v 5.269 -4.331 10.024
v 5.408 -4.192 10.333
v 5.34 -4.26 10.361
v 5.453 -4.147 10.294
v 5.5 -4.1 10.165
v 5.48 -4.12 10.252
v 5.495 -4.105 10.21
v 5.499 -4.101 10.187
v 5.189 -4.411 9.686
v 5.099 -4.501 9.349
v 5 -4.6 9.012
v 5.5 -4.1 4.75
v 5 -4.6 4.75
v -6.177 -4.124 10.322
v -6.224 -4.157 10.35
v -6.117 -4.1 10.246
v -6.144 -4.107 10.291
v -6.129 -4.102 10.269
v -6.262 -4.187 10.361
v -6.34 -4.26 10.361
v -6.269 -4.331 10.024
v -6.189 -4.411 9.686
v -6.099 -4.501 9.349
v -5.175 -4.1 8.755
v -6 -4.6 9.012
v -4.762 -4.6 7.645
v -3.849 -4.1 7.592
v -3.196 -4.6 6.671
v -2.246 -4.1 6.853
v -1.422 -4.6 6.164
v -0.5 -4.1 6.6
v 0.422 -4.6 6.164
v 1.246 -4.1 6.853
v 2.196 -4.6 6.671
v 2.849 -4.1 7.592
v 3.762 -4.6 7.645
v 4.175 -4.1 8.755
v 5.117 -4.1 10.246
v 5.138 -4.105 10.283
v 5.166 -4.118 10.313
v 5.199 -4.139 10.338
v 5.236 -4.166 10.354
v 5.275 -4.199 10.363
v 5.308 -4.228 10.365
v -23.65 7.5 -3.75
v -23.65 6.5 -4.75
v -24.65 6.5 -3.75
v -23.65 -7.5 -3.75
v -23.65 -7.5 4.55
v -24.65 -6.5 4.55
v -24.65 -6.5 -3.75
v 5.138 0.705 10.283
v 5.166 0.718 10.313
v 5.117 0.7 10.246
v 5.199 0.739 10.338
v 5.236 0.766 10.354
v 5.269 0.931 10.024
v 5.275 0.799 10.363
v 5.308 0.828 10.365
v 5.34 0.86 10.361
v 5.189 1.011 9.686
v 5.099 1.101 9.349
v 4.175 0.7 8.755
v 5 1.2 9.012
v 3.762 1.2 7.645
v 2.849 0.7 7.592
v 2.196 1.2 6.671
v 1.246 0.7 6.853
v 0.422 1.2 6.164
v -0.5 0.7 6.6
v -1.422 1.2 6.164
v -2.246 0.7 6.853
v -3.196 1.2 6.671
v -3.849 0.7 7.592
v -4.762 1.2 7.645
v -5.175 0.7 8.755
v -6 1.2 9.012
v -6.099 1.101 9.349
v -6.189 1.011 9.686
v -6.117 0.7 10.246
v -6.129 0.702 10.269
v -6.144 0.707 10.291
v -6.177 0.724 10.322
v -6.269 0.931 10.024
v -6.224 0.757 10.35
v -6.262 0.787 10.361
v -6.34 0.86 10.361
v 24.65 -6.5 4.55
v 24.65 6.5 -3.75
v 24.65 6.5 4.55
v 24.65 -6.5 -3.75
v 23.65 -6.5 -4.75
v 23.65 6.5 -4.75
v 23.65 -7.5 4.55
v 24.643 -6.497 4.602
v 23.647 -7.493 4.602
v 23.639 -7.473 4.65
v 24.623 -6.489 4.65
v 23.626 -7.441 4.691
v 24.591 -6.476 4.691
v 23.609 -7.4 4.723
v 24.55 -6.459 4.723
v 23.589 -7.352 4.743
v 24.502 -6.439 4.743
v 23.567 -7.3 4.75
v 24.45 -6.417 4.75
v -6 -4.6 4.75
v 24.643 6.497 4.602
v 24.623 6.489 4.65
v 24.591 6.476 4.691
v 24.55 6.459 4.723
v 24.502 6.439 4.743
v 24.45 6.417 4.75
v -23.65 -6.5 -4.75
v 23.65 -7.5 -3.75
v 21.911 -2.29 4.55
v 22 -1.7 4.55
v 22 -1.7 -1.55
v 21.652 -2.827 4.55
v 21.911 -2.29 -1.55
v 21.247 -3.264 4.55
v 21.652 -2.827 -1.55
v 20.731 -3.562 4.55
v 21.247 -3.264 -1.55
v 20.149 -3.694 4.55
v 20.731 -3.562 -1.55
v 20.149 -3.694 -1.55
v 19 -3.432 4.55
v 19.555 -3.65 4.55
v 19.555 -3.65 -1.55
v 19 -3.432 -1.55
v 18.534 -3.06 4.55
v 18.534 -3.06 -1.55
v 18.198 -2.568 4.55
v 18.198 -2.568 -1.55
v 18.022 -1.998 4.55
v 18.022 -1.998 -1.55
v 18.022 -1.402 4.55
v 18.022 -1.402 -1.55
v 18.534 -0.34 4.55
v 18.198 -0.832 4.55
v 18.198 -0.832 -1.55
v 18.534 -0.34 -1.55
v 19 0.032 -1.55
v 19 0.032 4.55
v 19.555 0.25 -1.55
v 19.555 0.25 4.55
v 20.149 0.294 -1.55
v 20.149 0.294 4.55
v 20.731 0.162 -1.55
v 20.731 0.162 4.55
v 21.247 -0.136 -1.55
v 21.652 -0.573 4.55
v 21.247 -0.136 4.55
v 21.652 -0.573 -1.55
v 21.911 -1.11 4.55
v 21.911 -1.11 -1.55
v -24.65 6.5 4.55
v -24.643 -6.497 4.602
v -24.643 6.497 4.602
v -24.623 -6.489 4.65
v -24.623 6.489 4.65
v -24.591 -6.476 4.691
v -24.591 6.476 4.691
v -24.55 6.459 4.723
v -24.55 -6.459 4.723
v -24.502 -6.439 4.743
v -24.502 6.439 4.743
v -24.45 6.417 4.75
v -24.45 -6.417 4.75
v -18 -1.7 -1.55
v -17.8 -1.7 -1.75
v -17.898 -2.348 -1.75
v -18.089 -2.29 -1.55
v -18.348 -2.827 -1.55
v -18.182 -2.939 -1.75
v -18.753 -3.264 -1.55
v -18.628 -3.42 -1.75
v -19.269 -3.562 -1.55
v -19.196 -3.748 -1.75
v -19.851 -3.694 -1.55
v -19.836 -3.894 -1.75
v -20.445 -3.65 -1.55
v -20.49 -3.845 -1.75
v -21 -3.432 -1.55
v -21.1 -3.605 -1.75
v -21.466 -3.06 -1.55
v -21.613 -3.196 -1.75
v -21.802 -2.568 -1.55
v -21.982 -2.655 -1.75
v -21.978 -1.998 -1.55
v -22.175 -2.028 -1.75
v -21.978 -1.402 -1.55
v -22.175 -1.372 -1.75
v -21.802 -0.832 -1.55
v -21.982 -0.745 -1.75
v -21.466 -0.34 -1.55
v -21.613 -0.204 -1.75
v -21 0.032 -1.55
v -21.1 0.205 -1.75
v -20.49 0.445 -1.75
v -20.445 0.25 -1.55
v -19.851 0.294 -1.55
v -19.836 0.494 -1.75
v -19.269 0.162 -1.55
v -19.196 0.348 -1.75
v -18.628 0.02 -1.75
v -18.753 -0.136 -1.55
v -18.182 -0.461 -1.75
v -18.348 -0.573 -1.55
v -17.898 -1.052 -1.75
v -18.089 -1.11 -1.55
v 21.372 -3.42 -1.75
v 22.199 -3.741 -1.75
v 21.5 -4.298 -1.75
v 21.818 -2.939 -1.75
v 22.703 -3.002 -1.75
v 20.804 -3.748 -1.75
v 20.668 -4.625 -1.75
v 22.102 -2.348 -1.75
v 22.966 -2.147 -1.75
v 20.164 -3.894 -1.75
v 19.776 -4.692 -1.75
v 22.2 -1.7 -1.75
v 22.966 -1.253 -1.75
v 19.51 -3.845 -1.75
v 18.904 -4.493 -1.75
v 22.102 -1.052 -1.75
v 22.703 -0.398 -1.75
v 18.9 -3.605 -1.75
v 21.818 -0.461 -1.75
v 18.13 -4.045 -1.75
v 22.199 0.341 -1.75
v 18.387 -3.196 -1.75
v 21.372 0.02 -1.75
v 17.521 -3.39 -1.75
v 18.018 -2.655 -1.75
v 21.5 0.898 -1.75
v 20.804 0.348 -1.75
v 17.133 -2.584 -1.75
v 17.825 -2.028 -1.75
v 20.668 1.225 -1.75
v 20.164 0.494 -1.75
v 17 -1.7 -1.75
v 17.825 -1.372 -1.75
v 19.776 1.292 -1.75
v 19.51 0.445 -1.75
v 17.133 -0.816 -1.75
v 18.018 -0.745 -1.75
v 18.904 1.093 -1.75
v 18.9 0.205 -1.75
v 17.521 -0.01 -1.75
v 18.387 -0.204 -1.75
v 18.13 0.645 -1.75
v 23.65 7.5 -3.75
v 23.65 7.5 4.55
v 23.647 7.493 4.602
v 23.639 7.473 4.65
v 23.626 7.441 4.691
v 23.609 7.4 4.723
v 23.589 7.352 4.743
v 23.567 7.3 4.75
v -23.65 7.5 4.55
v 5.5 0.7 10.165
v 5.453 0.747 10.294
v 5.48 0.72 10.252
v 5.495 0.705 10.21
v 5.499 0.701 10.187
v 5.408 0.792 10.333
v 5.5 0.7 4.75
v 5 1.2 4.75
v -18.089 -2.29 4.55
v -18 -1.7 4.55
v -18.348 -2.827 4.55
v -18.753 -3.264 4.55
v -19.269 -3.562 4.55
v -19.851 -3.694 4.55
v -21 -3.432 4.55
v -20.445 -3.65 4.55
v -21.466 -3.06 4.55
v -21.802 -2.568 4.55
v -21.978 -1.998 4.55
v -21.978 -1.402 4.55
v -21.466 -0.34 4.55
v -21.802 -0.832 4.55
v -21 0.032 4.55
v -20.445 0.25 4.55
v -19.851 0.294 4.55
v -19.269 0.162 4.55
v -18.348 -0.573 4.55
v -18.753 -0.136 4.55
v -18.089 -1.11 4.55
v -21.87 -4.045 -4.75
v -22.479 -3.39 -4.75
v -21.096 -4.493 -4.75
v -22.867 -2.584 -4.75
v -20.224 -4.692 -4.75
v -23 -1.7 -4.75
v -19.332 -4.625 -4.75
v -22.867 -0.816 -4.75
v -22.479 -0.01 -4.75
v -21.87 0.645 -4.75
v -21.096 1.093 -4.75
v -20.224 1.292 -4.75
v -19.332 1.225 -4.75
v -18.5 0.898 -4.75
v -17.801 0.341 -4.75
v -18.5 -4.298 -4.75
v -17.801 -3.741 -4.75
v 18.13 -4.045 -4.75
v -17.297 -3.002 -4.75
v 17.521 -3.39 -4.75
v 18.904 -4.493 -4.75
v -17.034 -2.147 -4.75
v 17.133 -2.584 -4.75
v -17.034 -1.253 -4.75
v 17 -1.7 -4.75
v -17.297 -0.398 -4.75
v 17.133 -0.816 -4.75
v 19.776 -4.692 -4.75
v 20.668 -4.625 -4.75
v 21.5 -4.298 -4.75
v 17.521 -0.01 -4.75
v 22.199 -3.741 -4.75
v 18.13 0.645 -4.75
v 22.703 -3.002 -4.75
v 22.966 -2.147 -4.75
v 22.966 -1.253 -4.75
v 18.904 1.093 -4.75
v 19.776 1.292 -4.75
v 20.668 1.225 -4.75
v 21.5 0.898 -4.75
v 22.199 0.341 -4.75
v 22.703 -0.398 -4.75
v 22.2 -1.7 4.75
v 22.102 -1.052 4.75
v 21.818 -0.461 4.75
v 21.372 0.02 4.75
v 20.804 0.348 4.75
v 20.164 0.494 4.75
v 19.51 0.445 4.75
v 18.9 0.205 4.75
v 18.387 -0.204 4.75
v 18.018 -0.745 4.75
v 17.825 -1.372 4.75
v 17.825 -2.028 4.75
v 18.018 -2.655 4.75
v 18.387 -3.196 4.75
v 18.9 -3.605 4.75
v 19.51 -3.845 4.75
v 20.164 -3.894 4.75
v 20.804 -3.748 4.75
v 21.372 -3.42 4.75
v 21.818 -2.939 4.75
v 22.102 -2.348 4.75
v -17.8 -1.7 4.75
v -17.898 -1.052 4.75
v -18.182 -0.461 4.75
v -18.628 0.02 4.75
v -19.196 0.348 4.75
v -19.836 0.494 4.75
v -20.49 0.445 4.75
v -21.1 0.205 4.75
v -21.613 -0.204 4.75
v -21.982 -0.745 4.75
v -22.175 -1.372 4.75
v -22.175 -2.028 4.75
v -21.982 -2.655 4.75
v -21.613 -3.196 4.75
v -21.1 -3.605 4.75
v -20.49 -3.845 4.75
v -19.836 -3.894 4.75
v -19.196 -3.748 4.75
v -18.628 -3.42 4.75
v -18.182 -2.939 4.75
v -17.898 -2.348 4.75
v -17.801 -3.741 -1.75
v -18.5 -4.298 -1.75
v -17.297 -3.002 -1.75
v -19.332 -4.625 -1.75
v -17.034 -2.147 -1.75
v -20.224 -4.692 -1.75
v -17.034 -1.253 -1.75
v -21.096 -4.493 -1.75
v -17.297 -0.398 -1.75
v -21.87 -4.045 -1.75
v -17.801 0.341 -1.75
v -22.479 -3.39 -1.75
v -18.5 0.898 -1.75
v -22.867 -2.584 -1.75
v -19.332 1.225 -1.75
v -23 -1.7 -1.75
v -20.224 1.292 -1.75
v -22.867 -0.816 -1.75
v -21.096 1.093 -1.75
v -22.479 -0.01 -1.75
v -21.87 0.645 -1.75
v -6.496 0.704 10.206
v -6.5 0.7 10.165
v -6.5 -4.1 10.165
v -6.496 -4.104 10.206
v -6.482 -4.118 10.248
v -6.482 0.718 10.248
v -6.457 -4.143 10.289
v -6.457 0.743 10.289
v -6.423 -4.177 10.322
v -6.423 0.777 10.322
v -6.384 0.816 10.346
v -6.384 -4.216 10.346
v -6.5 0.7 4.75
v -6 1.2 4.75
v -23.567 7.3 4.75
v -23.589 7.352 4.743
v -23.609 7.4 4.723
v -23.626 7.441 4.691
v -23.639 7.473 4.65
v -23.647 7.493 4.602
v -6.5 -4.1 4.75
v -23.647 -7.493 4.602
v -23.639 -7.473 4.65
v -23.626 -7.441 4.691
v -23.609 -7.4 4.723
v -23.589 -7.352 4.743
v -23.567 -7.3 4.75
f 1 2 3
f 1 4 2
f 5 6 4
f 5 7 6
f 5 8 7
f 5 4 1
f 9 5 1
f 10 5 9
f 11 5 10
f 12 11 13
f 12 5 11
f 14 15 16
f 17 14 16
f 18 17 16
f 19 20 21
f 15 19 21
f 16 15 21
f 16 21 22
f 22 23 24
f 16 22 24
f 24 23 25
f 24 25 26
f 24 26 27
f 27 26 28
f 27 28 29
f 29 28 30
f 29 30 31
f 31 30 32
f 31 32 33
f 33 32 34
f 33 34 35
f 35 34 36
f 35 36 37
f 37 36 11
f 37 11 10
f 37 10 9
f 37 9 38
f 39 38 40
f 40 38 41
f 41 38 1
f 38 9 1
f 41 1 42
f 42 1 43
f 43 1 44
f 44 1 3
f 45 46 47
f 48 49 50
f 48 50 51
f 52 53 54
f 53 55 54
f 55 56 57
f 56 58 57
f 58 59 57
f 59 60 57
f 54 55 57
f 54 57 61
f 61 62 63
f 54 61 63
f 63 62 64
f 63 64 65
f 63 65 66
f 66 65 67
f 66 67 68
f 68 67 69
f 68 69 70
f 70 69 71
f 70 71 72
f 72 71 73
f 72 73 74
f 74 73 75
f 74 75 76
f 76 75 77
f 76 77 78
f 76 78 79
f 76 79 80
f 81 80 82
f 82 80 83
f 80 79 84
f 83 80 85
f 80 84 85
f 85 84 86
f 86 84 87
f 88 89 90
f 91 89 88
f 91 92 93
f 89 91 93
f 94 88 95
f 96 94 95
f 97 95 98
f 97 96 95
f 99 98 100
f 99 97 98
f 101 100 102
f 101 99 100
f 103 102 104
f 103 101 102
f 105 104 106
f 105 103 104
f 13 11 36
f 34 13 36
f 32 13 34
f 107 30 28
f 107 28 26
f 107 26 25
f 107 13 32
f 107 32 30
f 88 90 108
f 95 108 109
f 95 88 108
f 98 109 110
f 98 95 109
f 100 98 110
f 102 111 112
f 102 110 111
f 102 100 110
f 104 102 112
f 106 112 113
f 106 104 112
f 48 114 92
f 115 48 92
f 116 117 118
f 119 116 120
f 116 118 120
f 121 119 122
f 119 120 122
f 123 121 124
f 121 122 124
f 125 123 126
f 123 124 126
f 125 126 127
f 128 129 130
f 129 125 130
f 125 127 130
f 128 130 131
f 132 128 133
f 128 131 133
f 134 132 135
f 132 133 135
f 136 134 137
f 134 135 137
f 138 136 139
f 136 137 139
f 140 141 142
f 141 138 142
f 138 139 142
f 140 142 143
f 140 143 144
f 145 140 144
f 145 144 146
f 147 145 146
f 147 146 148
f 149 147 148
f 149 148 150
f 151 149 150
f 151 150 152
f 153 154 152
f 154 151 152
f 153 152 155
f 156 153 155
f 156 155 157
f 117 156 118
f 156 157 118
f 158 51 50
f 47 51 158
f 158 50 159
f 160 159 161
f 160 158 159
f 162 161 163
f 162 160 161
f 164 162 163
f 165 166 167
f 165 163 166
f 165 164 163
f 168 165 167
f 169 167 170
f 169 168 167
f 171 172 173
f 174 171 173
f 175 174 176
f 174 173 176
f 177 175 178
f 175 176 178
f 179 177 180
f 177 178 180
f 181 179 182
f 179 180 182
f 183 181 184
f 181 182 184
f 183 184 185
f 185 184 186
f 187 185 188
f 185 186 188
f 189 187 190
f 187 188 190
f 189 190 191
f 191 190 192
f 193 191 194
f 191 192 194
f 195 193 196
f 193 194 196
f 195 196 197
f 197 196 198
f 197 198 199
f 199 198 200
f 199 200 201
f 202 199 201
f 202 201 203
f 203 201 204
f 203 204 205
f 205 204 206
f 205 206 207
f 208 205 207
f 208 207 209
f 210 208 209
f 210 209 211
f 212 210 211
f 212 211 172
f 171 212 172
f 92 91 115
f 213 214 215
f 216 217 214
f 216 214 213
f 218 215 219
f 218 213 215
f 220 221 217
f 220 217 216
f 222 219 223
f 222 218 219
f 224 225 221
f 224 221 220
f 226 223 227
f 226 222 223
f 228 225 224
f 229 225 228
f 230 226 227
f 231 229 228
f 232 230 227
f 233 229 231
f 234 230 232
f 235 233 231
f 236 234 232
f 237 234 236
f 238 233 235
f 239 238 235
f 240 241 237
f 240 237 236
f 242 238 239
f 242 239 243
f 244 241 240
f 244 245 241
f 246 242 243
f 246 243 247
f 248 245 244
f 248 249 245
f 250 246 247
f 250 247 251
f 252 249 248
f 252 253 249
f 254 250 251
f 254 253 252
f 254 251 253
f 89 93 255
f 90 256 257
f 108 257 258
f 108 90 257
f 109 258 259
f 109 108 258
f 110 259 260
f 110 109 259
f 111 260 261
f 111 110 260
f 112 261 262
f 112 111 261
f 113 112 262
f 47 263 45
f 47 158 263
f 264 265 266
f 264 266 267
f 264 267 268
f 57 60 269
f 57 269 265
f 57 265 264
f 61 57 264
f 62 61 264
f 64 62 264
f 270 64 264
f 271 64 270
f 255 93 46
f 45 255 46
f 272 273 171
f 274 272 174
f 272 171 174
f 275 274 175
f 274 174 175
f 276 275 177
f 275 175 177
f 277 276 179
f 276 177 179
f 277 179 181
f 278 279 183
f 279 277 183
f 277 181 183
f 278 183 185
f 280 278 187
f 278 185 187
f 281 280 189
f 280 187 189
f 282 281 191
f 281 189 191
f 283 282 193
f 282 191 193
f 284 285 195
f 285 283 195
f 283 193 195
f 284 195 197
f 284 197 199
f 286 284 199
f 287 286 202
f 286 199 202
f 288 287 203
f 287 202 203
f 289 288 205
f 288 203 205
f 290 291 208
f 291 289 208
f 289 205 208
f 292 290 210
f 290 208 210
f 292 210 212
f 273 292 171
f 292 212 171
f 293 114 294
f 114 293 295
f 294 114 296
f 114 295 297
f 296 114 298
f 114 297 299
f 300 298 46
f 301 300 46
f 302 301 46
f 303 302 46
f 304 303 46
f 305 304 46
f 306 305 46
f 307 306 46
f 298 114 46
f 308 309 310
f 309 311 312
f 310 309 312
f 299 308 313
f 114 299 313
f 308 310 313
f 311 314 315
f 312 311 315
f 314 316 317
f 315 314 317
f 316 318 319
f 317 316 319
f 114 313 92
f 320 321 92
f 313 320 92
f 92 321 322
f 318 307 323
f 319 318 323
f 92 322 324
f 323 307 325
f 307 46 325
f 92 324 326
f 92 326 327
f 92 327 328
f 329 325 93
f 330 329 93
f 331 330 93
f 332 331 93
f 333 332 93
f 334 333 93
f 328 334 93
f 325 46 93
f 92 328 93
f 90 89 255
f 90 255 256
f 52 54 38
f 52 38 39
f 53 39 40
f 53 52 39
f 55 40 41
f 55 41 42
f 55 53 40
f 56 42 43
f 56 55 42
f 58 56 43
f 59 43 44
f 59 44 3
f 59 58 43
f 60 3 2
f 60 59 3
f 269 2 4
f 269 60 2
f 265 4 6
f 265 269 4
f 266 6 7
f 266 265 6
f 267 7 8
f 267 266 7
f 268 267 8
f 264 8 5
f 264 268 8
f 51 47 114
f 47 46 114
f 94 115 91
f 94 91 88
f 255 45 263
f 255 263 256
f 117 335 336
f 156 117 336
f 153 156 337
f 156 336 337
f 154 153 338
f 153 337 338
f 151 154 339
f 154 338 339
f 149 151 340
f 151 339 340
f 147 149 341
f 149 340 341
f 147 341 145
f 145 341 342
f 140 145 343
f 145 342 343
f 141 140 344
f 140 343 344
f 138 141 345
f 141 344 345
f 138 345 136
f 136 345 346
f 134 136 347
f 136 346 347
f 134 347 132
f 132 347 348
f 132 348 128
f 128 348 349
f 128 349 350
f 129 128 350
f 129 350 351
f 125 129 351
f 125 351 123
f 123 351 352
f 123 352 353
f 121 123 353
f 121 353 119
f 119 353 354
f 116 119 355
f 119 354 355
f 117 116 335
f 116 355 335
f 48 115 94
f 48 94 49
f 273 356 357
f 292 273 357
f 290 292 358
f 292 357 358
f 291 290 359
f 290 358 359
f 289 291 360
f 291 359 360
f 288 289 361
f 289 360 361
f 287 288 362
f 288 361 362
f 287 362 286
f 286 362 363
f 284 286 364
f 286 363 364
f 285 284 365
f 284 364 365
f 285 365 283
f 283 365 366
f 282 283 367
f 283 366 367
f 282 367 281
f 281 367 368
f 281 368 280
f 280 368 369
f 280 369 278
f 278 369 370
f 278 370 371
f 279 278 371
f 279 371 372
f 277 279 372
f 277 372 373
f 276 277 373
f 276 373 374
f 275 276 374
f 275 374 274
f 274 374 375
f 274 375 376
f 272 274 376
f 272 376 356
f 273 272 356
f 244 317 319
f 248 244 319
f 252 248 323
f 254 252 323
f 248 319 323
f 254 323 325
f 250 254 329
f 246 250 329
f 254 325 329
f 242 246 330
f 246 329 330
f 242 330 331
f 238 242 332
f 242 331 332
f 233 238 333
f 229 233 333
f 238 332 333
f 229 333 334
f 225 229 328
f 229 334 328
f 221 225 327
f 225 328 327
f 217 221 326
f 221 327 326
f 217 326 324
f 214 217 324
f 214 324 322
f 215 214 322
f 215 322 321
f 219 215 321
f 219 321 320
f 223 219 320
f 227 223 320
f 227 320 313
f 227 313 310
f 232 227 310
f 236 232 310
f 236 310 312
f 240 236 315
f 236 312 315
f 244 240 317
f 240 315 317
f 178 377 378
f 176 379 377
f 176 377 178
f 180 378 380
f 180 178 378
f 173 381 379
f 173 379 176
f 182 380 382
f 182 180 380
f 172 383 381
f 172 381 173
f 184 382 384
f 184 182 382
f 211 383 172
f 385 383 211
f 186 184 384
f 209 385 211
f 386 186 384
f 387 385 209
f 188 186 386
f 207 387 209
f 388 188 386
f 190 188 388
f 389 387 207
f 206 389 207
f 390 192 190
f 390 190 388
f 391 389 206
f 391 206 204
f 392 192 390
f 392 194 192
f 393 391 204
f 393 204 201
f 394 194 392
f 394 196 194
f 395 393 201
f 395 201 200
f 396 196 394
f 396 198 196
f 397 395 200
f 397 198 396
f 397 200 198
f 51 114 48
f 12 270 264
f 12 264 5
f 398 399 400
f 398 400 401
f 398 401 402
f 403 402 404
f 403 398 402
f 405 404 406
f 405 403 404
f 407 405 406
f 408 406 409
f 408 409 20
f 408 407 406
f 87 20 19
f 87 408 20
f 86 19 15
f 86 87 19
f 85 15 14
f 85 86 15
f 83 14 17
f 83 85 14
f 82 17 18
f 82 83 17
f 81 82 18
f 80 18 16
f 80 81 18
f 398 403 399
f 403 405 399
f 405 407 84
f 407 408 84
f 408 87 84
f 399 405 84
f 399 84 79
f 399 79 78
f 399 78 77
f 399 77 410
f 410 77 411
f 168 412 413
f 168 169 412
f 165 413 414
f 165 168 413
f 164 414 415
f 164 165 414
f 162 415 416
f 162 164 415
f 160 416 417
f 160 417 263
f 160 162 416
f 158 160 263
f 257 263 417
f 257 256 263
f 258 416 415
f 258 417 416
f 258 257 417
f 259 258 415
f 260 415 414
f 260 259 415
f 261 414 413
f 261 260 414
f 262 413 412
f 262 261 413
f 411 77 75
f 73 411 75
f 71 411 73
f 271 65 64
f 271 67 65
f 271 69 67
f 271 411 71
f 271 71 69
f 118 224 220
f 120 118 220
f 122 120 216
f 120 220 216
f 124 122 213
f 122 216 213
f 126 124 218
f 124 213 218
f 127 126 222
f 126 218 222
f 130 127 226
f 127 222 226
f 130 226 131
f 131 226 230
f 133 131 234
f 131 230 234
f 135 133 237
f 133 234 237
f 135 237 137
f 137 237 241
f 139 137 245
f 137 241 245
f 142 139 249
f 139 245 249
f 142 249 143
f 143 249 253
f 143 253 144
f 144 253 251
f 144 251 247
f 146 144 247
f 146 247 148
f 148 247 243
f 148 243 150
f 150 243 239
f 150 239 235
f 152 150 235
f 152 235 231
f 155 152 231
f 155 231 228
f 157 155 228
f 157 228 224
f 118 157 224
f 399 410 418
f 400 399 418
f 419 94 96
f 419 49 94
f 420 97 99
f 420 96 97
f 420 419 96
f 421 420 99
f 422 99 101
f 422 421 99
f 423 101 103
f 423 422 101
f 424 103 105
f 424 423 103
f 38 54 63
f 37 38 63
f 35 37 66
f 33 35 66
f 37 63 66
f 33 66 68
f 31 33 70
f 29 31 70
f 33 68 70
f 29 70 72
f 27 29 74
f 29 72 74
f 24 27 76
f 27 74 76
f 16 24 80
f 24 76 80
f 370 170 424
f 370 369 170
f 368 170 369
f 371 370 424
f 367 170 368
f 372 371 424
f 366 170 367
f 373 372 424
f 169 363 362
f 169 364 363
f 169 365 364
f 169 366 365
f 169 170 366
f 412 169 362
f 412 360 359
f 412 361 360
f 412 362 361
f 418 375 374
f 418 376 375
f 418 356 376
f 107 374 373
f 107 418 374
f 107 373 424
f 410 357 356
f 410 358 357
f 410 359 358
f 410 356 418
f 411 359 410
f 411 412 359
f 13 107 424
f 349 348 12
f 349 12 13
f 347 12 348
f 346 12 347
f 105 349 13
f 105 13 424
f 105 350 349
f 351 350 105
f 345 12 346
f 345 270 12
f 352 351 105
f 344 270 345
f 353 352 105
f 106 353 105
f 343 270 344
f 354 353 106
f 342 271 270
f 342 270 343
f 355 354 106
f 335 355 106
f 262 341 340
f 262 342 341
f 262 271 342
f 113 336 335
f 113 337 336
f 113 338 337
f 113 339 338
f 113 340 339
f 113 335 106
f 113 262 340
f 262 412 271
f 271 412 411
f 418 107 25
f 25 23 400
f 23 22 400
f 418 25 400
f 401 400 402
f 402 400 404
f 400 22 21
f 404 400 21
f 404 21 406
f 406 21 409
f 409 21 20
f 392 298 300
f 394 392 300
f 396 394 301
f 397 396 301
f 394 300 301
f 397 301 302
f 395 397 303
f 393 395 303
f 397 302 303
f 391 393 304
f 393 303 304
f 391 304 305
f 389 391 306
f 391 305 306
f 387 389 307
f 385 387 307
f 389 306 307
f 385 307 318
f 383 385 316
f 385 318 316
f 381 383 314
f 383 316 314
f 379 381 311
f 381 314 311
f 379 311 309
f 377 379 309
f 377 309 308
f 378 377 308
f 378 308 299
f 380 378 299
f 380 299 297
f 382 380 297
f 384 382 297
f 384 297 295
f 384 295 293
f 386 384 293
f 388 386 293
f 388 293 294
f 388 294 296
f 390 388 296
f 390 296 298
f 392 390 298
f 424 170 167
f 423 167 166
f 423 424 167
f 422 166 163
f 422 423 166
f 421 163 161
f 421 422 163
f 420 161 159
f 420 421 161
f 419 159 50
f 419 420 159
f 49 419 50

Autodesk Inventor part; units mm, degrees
ref_plane "YZ Plane" through (0, 0, 0) normal (1, 0, 0) x (0, 1, 0)
ref_plane "XZ Plane" through (0, 0, 0) normal (0, 1, 0) x (-1, 0, 0)
ref_plane "XY Plane" through (0, 0, 0) normal (0, 0, 1) x (1, 0, 0)
sketch "Sketch1" plane through (0, 0, 0) normal (0, 0, 1) x (1, 0, 0)
  line L0 (-24.65, 7.5) -> (24.65, 7.5)
  line L1 (24.65, 7.5) -> (24.65, -7.5)
  line L2 (24.65, -7.5) -> (-24.65, -7.5)
  line L3 (-24.65, -7.5) -> (-24.65, 7.5)
  circle A0 centre (-20, -1.7) radius 2
  circle A1 centre (20, -1.7) radius 2
  point P0 (0, 0)
  point P1 (-24.65, 0)
  point P2 (0, 7.5)
  dimension "d0" = 49.3
  dimension "d1" = 15
  dimension "d2" = 4
  dimension "d3" = 40
  dimension "d7" = 9.2
  dimension "d8" = 9.2
  dimension "d9" = 20
extrude "Extrusion1" add sketch "Sketch1" along normal mid plane 9.5
sketch "Sketch2" plane through (0, 0, 4.75) normal (0, 0, 1) x (1, 0, 0)
  line L0 (-6.65, 1.2) -> (5.65, 1.2)
  line L1 (5.65, 1.2) -> (5.65, -4.6)
  line L2 (5.65, -4.6) -> (-6.65, -4.6)
  line L3 (-6.65, -4.6) -> (-6.65, 1.2)
  line L4 (-24.65, 7.5) -> (24.65, 7.5) projected
  line L5 (24.65, -7.5) -> (24.65, 7.5) projected
  line L6 (-6.5, 1.2) -> (-6.5, -4.6)
  line L7 (-24.65, -7.5) -> (24.65, -7.5) projected
  line L8 (5.5, 1.2) -> (5.5, -4.6)
  point P0 (0, 0)
  dimension "d10" = 5.8
  dimension "d11" = 6.3
  dimension "d12" = 12.3
  dimension "d13" = 19
  dimension "d14" = 0.15
extrude "Extrusion3" add sketch "Sketch2" along normal blind 8 contours L0 L8 L2 L6
sketch "Sketch3" plane through (-6.5, 1.2, 4.75) normal (0, 1, 0) x (1, 0, 0)
  line L0 (0, -8) -> (12, -8) projected
  circle A0 centre (6, -8) radius 6.15
  point P0 (6.5, 4.75)
  dimension "d20" = 12.3
extrude "Extrusion4" cut sketch "Sketch3" against normal blind 8
chamfer "Chamfer1" distance 0.5 angle 45 4 edges at (-6.5, -4.6, 8.075) (-6.5, 1.2, 8.075) (5.5, 1.2, 8.075) (5.5, -4.6, 8.075)
chamfer "Chamfer2" distance 0.5 angle 45 2 edges at (-0.5, -4.6, 6.6) (-0.5, 1.2, 6.6)
fillet "Fillet1" radius 0.2 2 edges at (-6.5, -1.7, 11.4) (5.5, -1.7, 11.4)
chamfer "Chamfer3" distance 1 angle 45 8 edges at (24.65, 0, -4.75) (-24.65, 0, -4.75) (0, 7.5, -4.75) (24.65, 7.5, 0) (-24.65, 7.5, 0) (24.65, -7.5, 0) (0, -7.5, -4.75) (-24.65, -7.5, 0)
sketch "Sketch4" plane through (0, 0, -4.75) normal (0, 0, -1) x (-1, 0, 0)
  circle A0 centre (-20, -1.7) radius 2 projected
  circle A1 centre (-20, -1.7) radius 3
  circle A2 centre (20, -1.7) radius 2 projected
  circle A3 centre (20, -1.7) radius 3
  point P0 (0, 0)
  dimension "d33" = 6
  dimension "d34" = 6
extrude "Extrusion5" cut sketch "Sketch4" against normal blind 3 contours A0 | A1 | A2 | A3
fillet "Fillet2" radius 0.2 8 edges at (0, 7.5, 4.75) (0, -7.5, 4.75) (-24.65, 0, 4.75) (24.65, 0, 4.75) (24.15, 7, 4.75) (24.15, -7, 4.75) (-24.15, -7, 4.75) (-24.15, 7, 4.75)
chamfer "Chamfer4" distance 0.2 angle 45 4 edges at (-22, -1.7, 4.75) (18, -1.7, 4.75) (-22, -1.7, -1.75) (18, -1.7, -1.75)
equation "\"d9\" = 0.5 * d3"
properties part number "single extruder securer"
